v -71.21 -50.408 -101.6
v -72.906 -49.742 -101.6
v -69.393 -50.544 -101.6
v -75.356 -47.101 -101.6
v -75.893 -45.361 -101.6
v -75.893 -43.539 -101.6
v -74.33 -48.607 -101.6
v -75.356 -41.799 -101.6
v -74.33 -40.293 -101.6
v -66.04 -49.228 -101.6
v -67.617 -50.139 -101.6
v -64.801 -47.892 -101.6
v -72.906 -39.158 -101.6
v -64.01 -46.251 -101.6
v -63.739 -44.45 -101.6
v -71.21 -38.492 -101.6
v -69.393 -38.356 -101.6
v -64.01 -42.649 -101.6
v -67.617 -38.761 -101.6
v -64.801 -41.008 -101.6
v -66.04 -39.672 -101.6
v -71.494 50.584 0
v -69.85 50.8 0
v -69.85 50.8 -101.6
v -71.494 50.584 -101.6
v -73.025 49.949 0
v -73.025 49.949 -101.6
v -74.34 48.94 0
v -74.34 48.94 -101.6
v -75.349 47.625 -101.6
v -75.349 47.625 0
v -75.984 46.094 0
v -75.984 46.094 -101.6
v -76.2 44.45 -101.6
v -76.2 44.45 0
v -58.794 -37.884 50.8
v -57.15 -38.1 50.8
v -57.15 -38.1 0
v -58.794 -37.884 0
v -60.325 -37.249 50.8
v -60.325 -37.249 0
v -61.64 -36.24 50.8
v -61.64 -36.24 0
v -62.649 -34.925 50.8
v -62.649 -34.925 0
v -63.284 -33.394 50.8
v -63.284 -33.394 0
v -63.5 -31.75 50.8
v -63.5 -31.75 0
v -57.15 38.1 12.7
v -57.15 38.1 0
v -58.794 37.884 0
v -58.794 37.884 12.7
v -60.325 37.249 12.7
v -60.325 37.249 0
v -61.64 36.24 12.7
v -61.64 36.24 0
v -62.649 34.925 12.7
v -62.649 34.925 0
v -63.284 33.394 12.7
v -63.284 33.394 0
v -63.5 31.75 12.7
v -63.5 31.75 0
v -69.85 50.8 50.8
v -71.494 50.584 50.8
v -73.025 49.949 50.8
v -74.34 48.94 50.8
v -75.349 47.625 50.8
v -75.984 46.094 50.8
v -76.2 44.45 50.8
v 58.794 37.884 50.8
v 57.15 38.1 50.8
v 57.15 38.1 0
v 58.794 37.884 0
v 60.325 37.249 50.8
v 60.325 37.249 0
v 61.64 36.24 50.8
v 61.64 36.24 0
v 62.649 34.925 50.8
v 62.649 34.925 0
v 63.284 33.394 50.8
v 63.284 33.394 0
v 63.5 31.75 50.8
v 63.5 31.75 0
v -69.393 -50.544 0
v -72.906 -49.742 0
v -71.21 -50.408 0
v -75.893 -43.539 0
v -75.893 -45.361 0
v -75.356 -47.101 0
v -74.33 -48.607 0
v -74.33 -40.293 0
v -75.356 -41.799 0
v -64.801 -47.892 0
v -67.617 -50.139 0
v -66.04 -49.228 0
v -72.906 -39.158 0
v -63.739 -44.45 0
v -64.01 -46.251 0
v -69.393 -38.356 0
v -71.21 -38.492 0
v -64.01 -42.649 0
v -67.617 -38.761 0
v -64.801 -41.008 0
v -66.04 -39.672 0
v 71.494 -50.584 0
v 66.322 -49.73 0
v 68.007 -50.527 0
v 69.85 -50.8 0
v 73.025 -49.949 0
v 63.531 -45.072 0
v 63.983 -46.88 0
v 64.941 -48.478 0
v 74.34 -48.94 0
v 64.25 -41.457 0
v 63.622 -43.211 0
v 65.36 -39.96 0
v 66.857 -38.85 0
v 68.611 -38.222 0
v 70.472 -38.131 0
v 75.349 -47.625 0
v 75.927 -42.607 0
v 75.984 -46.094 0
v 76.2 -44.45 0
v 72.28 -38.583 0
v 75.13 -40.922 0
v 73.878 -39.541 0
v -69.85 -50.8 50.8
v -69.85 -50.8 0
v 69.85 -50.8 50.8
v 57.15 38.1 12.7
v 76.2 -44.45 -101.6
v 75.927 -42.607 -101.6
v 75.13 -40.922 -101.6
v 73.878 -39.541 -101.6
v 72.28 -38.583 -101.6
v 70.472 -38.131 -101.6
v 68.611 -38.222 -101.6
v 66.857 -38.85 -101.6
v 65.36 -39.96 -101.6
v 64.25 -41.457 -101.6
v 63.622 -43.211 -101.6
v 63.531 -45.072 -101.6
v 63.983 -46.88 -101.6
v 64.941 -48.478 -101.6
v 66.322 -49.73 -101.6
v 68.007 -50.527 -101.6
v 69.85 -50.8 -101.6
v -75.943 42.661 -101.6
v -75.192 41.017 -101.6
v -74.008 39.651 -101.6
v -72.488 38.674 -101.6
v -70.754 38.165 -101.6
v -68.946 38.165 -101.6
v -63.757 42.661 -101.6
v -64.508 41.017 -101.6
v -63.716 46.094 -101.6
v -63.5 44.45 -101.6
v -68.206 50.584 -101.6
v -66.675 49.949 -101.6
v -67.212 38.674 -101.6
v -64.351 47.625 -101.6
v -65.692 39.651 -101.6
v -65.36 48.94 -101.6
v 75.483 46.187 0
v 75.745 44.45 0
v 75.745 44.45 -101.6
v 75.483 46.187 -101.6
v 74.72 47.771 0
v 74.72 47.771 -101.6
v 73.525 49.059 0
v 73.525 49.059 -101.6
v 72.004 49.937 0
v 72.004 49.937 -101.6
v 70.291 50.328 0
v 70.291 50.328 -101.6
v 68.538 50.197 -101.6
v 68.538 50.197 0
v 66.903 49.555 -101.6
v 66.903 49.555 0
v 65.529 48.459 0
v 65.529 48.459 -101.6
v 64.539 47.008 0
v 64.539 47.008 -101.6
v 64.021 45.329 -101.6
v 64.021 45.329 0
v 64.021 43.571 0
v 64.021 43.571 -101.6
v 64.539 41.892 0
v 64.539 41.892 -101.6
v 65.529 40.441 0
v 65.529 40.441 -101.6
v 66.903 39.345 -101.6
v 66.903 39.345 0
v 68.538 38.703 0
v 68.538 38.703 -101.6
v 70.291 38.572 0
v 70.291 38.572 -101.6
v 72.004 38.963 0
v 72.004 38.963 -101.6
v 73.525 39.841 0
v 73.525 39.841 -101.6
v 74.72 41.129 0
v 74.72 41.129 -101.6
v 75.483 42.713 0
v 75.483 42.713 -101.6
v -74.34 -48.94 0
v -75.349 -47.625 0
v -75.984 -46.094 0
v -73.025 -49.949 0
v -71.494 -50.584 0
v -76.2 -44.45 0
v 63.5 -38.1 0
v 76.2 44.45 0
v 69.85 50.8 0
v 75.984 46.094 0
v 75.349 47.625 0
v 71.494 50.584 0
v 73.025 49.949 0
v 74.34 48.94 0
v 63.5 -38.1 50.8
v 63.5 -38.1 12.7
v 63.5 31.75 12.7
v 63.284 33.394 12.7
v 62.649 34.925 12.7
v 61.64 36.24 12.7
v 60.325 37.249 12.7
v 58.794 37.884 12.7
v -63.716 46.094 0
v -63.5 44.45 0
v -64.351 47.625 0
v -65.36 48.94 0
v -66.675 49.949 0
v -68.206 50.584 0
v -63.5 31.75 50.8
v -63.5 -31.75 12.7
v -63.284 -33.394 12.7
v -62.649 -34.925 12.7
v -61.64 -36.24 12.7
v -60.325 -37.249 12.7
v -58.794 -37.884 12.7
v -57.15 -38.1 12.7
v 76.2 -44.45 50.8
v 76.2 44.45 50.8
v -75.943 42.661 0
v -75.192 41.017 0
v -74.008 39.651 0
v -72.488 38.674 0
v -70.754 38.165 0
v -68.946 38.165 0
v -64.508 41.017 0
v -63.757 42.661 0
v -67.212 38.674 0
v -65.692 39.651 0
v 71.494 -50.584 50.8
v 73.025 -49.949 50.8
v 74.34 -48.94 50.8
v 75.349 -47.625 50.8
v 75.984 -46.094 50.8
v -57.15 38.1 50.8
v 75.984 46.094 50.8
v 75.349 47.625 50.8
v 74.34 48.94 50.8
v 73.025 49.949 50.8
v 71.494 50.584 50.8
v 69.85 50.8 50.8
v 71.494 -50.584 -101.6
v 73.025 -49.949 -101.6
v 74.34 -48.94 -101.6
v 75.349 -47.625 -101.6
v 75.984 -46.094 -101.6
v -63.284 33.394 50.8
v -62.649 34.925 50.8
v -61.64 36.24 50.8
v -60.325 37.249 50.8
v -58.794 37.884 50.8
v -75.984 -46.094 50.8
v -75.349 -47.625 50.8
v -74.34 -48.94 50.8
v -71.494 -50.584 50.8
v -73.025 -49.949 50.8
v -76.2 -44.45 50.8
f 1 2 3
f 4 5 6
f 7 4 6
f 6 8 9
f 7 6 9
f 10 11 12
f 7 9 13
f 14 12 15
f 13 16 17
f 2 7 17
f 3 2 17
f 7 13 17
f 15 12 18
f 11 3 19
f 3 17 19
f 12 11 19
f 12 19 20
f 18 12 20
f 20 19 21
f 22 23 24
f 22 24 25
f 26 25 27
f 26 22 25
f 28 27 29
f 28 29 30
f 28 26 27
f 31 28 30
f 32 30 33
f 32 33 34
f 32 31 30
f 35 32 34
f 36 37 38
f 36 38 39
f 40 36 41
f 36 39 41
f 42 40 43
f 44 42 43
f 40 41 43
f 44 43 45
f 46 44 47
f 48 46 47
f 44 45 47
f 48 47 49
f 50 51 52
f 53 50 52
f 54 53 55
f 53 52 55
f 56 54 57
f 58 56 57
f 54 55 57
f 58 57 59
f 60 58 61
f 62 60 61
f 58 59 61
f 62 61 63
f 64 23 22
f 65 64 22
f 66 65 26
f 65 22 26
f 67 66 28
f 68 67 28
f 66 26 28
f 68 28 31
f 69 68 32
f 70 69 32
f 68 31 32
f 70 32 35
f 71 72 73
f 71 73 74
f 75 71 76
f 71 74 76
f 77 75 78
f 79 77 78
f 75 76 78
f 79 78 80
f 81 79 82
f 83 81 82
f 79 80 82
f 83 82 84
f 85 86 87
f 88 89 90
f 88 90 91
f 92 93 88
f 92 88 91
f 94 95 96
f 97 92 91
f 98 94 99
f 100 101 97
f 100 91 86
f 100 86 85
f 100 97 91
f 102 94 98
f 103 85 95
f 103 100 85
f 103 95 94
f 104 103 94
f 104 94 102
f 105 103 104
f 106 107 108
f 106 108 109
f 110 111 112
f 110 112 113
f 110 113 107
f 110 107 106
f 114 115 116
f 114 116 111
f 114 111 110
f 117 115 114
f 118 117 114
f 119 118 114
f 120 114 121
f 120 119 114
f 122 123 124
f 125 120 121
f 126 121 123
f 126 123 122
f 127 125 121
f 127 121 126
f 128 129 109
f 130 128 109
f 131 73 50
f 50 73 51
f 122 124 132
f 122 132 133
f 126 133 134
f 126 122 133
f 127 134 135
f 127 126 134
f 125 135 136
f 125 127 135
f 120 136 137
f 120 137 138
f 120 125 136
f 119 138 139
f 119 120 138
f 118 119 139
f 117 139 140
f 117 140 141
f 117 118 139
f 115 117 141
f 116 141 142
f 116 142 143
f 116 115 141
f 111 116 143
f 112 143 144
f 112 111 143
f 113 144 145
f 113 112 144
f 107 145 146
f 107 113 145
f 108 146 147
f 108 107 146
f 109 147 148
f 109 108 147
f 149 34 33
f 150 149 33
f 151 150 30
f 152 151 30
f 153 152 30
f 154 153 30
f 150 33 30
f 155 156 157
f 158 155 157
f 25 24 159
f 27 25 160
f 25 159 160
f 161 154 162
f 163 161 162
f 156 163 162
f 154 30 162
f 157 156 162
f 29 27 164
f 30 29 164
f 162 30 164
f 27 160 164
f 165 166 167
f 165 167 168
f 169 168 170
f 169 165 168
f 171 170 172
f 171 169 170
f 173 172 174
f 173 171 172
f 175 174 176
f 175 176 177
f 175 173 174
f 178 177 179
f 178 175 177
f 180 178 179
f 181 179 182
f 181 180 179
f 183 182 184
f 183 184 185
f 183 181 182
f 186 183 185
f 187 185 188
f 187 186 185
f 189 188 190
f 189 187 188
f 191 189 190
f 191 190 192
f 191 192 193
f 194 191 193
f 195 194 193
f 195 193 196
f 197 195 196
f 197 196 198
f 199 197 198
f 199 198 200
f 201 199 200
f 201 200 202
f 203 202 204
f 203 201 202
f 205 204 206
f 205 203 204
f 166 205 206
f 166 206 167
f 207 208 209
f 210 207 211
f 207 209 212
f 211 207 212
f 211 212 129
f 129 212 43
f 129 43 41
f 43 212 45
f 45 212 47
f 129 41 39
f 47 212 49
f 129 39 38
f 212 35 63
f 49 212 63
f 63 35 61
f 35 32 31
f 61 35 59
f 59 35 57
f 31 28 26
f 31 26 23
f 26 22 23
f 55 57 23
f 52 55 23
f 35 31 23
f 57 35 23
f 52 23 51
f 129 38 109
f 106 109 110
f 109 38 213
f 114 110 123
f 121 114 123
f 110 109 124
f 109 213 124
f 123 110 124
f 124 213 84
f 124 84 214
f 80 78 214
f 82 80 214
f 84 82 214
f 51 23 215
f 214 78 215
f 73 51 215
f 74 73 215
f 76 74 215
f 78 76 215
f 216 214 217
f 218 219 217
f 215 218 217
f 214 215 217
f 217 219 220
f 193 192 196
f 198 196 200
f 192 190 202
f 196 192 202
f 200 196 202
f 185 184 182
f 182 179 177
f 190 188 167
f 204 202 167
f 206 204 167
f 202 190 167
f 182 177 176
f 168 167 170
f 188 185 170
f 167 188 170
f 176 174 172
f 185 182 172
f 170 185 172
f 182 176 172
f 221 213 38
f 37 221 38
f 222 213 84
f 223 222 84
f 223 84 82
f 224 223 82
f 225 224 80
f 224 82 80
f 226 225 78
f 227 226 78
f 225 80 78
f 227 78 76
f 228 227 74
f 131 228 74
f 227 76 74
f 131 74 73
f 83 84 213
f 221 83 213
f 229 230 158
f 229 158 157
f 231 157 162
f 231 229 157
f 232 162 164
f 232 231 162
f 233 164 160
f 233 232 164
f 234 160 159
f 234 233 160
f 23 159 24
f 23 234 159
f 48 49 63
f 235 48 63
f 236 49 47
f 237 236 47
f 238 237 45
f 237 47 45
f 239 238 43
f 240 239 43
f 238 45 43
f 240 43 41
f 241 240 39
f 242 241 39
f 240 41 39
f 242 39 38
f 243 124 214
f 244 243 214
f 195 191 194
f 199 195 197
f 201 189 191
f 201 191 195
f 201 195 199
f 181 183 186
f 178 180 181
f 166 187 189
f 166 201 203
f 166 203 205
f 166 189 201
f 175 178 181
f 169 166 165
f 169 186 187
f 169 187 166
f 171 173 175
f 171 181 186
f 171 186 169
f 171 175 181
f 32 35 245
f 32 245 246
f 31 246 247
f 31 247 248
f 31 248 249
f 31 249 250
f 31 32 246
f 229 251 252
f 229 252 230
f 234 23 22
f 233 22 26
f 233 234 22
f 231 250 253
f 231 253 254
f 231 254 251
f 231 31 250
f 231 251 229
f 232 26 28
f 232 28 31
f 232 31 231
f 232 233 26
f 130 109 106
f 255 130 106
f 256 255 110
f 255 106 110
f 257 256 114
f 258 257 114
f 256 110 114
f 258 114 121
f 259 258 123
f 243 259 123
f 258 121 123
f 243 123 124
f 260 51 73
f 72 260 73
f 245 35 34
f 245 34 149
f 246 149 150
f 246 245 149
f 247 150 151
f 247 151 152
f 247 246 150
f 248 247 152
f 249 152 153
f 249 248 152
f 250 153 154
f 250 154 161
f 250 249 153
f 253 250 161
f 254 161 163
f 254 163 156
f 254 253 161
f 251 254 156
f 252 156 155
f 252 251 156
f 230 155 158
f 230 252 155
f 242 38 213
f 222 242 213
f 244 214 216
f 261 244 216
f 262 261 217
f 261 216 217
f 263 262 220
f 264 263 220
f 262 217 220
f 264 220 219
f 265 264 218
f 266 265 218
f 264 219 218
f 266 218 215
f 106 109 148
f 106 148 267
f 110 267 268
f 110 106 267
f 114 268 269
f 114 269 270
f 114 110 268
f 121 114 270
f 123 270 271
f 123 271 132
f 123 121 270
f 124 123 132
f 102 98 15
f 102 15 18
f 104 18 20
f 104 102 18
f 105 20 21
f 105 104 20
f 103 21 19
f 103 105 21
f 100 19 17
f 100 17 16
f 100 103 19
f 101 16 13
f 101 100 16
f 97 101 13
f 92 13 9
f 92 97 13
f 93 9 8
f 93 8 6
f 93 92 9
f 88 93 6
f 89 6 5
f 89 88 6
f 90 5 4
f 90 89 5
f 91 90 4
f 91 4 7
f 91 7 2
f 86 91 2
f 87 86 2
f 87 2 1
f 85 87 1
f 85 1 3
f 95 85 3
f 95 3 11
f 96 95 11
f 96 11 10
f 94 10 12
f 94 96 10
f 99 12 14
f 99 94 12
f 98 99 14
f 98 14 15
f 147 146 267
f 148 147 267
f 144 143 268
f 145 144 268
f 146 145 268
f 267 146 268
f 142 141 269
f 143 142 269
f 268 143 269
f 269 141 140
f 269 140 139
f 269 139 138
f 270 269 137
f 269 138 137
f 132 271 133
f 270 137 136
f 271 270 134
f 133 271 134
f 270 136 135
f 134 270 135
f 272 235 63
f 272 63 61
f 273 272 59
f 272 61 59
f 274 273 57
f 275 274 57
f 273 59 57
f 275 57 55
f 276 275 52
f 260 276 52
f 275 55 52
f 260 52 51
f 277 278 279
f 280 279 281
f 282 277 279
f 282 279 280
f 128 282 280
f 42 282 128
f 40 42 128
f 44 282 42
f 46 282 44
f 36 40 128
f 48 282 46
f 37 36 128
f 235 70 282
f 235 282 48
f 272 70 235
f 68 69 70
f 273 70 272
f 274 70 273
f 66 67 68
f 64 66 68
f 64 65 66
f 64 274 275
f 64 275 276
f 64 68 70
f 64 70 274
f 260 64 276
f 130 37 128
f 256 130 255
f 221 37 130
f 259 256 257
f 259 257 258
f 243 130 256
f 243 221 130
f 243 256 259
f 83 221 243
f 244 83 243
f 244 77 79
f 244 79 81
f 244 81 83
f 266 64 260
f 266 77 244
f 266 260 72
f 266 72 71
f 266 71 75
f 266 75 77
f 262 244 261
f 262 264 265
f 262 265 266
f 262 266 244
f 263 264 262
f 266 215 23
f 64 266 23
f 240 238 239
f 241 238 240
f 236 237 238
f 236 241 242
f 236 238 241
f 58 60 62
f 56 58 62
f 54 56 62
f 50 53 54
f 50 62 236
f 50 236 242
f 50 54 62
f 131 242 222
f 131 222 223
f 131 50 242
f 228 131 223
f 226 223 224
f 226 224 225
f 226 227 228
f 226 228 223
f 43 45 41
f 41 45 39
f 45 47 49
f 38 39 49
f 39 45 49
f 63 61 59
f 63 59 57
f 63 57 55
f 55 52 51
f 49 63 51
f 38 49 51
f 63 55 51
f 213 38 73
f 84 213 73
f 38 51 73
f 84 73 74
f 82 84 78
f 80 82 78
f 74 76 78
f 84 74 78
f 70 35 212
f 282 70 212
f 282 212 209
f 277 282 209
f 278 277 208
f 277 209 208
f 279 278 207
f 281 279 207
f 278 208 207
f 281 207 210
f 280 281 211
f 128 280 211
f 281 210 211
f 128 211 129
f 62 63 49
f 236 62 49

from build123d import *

# Parameters (mm, degrees)
F0_R     = 6.111034
F0_R_2   = 5.894709
F1_DEPTH = 50.8
F2_DEPTH = 101.6
F3_DEPTH = 12.7


with BuildPart() as f1:
    # F0 (on Top) → F1 (new body)
    with BuildSketch(Plane.XY):
        with BuildLine():
            ThreePointArc((76.2, 44.45), (74.340128, 48.940128), (69.85, 50.8))
            Line((69.85, 50.8), (-69.85, 50.8))
            ThreePointArc((-69.85, 50.8), (-65.359872, 48.940128), (-63.5, 44.45))
            ThreePointArc((-63.5, 44.45), (-69.85, 38.1), (-76.2, 44.45))
            Line((-76.2, 44.45), (-76.2, -44.45))
            ThreePointArc((-76.2, -44.45), (-74.340128, -48.940128), (-69.85, -50.8))
            Line((-69.85, -50.8), (69.85, -50.8))
            ThreePointArc((69.85, -50.8), (65.359872, -39.959872), (76.2, -44.45))
            Line((76.2, -44.45), (76.2, 44.45))
        make_face()
        with Locations((-69.85, -44.45)):
            Circle(F0_R, mode=Mode.SUBTRACT)
        with BuildLine():
            Line((-57.15, 38.1), (57.15, 38.1))
            ThreePointArc((57.15, 38.1), (61.640128, 36.240128), (63.5, 31.75))
            Line((63.5, 31.75), (63.5, -38.1))
            Line((63.5, -38.1), (-57.15, -38.1))
            ThreePointArc((-57.15, -38.1), (-61.640128, -36.240128), (-63.5, -31.75))
            Line((-63.5, -31.75), (-63.5, 31.75))
            ThreePointArc((-63.5, 31.75), (-61.640128, 36.240128), (-57.15, 38.1))
        make_face(mode=Mode.SUBTRACT)
        with Locations((69.85, 44.45)):
            Circle(F0_R_2, mode=Mode.SUBTRACT)
        with BuildLine():
            ThreePointArc((-63.5, 44.45), (-65.359872, 48.940128), (-69.85, 50.8))
            ThreePointArc((-69.85, 50.8), (-74.340128, 48.940128), (-76.2, 44.45))
            ThreePointArc((-76.2, 44.45), (-69.85, 38.1), (-63.5, 44.45))
        make_face()
        with BuildLine():
            ThreePointArc((69.85, -50.8), (74.340128, -48.940128), (76.2, -44.45))
            ThreePointArc((76.2, -44.45), (65.359872, -39.959872), (69.85, -50.8))
        make_face()
        with Locations((69.85, 44.45)):
            Circle(F0_R_2)
        with Locations((-69.85, -44.45)):
            Circle(F0_R)
    extrude(amount=F1_DEPTH)


with BuildPart() as f2:
    # F0 (on Top) → F2 (new body)
    with BuildSketch(Plane.XY):
        with BuildLine():
            ThreePointArc((-63.5, 44.45), (-65.359872, 48.940128), (-69.85, 50.8))
            ThreePointArc((-69.85, 50.8), (-74.340128, 48.940128), (-76.2, 44.45))
            ThreePointArc((-76.2, 44.45), (-69.85, 38.1), (-63.5, 44.45))
        make_face()
        with Locations((69.85, 44.45)):
            Circle(F0_R_2)
        with BuildLine():
            ThreePointArc((69.85, -50.8), (74.340128, -48.940128), (76.2, -44.45))
            ThreePointArc((76.2, -44.45), (65.359872, -39.959872), (69.85, -50.8))
        make_face()
        with Locations((-69.85, -44.45)):
            Circle(F0_R)
    extrude(amount=-F2_DEPTH)


with BuildPart() as f3:
    # F0 (on Top) → F3 (new body)
    with BuildSketch(Plane.XY):
        with BuildLine():
            ThreePointArc((63.5, 31.75), (61.640128, 36.240128), (57.15, 38.1))
            Line((57.15, 38.1), (-57.15, 38.1))
            ThreePointArc((-57.15, 38.1), (-61.640128, 36.240128), (-63.5, 31.75))
            Line((-63.5, 31.75), (-63.5, -31.75))
            ThreePointArc((-63.5, -31.75), (-61.640128, -36.240128), (-57.15, -38.1))
            Line((-57.15, -38.1), (63.5, -38.1))
            Line((63.5, -38.1), (63.5, 31.75))
        make_face()
    extrude(amount=F3_DEPTH)


solid = Compound([f1.part, f2.part, f3.part])
